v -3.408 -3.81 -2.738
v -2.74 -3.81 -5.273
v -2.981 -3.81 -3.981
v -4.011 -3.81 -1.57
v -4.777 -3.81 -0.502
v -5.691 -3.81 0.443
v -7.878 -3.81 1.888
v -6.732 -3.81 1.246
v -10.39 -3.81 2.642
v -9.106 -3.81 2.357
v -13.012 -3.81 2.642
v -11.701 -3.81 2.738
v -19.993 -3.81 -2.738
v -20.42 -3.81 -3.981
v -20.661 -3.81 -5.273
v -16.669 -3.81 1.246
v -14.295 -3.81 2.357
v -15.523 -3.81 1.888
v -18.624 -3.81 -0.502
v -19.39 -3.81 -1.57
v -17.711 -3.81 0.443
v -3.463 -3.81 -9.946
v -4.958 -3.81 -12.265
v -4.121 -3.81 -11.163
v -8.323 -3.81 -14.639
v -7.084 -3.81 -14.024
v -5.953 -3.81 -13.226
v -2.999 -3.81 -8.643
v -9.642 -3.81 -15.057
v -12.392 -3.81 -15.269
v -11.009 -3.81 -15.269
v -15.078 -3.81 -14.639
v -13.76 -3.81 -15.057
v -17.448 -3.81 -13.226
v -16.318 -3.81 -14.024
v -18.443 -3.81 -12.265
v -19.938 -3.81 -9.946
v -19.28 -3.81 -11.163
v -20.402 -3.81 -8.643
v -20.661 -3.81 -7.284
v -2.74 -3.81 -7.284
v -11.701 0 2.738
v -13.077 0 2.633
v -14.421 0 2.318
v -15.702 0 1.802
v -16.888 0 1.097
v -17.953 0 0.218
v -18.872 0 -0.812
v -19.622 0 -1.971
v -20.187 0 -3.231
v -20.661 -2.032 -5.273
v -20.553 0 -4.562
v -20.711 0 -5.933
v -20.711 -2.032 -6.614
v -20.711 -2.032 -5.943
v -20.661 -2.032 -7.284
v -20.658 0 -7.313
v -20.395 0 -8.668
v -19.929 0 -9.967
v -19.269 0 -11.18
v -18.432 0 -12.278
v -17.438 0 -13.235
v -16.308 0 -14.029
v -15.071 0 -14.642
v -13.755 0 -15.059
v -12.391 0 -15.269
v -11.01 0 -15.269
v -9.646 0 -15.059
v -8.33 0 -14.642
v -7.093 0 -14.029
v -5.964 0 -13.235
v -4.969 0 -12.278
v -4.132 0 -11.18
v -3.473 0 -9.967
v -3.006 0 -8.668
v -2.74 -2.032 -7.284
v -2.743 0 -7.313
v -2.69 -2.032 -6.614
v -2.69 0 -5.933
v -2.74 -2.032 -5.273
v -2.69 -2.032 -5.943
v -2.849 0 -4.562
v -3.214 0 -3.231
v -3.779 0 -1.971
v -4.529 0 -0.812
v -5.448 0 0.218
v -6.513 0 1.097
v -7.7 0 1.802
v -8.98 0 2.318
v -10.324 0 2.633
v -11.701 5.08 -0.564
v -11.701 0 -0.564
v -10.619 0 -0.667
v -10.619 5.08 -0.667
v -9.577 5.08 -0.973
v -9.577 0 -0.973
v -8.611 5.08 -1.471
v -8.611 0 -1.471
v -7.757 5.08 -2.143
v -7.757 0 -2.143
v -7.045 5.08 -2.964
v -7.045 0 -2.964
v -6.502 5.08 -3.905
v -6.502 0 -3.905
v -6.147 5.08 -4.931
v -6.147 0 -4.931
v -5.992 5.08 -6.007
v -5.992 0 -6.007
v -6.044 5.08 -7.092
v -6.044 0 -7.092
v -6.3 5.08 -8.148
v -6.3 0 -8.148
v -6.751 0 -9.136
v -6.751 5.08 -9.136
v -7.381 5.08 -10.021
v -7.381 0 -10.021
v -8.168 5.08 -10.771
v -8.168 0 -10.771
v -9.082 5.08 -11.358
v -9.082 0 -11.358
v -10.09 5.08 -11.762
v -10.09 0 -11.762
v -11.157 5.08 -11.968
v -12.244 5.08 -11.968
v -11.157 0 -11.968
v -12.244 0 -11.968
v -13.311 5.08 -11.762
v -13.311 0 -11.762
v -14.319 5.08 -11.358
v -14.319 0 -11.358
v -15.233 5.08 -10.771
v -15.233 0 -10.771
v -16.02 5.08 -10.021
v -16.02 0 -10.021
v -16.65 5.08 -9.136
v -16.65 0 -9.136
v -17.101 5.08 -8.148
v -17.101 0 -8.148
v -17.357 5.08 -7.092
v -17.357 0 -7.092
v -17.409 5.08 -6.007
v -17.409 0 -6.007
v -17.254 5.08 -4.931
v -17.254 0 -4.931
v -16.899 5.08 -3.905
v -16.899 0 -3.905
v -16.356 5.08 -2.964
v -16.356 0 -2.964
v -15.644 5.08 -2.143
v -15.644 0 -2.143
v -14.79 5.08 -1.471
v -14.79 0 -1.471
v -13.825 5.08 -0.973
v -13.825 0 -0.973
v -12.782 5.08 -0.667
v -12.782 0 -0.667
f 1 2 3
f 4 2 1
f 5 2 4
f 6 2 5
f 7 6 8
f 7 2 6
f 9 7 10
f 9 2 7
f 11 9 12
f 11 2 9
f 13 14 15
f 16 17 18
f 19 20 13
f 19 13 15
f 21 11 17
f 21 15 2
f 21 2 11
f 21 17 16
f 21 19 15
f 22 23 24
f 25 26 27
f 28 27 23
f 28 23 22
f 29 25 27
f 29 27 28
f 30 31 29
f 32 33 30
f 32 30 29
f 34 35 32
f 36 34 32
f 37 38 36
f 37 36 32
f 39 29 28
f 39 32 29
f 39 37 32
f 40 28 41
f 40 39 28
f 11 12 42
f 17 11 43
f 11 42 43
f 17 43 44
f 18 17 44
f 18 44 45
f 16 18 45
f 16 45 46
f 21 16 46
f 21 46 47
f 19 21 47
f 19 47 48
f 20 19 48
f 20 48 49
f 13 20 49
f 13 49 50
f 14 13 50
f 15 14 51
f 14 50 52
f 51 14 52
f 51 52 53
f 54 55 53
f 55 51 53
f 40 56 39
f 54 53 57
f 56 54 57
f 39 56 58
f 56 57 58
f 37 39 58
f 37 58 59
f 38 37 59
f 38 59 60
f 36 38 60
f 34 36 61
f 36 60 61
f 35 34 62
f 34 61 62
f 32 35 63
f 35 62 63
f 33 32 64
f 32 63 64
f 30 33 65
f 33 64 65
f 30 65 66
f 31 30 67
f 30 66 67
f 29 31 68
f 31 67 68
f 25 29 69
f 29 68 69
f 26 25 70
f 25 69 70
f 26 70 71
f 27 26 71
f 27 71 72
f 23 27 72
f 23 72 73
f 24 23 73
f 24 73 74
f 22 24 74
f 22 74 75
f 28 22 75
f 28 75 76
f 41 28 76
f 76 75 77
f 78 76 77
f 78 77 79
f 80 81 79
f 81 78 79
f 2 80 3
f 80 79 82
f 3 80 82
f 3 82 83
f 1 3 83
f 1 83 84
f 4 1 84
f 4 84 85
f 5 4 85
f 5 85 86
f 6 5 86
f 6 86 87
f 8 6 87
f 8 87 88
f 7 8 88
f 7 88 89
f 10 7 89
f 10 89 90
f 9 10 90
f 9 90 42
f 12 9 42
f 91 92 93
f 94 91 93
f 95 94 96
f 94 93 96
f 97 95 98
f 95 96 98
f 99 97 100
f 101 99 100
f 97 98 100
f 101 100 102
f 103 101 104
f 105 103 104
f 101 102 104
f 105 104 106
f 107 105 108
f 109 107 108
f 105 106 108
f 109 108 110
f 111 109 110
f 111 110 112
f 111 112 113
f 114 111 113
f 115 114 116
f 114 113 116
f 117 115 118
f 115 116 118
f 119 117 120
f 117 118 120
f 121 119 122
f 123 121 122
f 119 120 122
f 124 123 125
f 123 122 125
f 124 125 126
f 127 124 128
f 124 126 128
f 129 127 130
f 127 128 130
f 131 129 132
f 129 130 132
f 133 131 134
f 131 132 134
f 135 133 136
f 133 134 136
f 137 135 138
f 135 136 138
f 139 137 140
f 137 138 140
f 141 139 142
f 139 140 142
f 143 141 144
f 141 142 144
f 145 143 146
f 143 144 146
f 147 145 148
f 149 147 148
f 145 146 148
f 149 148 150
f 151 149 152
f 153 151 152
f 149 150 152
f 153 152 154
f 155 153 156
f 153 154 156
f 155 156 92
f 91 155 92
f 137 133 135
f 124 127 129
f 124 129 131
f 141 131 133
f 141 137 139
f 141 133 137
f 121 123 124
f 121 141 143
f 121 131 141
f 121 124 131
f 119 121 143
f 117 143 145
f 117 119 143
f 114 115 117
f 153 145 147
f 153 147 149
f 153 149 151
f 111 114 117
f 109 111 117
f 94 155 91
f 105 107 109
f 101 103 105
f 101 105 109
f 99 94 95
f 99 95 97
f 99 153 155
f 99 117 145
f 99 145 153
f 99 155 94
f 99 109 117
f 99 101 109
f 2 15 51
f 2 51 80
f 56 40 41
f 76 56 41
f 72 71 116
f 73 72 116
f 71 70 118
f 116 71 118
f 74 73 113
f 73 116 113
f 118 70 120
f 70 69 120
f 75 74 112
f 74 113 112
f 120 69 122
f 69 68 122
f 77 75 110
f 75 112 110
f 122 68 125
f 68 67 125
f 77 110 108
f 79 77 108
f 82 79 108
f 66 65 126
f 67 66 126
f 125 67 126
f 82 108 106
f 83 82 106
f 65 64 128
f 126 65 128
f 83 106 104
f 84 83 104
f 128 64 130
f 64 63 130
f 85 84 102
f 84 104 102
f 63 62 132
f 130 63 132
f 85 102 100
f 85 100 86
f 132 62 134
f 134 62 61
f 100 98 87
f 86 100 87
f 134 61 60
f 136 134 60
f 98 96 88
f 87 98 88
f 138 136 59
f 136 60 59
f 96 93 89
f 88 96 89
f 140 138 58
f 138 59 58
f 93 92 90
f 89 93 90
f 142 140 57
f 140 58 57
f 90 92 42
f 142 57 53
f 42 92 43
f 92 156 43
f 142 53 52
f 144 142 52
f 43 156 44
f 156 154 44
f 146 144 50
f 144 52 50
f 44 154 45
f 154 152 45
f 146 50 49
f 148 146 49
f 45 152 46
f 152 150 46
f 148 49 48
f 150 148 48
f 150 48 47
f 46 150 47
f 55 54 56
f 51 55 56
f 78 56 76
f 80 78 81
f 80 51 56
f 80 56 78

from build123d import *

# Parameters (mm, degrees)
SKETCH1_R           = 5.715
BOSS_EXTRUDE1_DEPTH = 5.08
SKETCH2_R           = 9.017
BOSS_EXTRUDE2_DEPTH = 3.81
SKETCH3_W           = 18.688246184
SKETCH3_H           = 2.010717395
CUT_EXTRUDE1_DEPTH  = 1.778


with BuildPart() as part:
    # Sketch1 → Boss-Extrude1 (new body)
    with BuildSketch(Plane(origin=(0, 0, 0), x_dir=(1, 0, 0), z_dir=(0, 1, 0))):
        with Locations(Location((-11.700574837, 6.278703551, 0), (0, 0, 270))):
            Circle(SKETCH1_R)
    extrude(amount=BOSS_EXTRUDE1_DEPTH)

    # Sketch2 → Boss-Extrude2 (add)
    with BuildSketch(Plane.XZ):
        with Locations(Location((-11.700574837, -6.278703551, 0), (0, 0, 90))):
            Circle(SKETCH2_R)
    extrude(amount=BOSS_EXTRUDE2_DEPTH)

    # Sketch3 → Cut-Extrude1 (cut)
    with BuildSketch(Plane.XZ.offset(3.81)):
        with Locations((-11.700574837, -6.278703552)):
            Rectangle(SKETCH3_W, SKETCH3_H)
    extrude(amount=-CUT_EXTRUDE1_DEPTH, mode=Mode.SUBTRACT)


solid = part.part
